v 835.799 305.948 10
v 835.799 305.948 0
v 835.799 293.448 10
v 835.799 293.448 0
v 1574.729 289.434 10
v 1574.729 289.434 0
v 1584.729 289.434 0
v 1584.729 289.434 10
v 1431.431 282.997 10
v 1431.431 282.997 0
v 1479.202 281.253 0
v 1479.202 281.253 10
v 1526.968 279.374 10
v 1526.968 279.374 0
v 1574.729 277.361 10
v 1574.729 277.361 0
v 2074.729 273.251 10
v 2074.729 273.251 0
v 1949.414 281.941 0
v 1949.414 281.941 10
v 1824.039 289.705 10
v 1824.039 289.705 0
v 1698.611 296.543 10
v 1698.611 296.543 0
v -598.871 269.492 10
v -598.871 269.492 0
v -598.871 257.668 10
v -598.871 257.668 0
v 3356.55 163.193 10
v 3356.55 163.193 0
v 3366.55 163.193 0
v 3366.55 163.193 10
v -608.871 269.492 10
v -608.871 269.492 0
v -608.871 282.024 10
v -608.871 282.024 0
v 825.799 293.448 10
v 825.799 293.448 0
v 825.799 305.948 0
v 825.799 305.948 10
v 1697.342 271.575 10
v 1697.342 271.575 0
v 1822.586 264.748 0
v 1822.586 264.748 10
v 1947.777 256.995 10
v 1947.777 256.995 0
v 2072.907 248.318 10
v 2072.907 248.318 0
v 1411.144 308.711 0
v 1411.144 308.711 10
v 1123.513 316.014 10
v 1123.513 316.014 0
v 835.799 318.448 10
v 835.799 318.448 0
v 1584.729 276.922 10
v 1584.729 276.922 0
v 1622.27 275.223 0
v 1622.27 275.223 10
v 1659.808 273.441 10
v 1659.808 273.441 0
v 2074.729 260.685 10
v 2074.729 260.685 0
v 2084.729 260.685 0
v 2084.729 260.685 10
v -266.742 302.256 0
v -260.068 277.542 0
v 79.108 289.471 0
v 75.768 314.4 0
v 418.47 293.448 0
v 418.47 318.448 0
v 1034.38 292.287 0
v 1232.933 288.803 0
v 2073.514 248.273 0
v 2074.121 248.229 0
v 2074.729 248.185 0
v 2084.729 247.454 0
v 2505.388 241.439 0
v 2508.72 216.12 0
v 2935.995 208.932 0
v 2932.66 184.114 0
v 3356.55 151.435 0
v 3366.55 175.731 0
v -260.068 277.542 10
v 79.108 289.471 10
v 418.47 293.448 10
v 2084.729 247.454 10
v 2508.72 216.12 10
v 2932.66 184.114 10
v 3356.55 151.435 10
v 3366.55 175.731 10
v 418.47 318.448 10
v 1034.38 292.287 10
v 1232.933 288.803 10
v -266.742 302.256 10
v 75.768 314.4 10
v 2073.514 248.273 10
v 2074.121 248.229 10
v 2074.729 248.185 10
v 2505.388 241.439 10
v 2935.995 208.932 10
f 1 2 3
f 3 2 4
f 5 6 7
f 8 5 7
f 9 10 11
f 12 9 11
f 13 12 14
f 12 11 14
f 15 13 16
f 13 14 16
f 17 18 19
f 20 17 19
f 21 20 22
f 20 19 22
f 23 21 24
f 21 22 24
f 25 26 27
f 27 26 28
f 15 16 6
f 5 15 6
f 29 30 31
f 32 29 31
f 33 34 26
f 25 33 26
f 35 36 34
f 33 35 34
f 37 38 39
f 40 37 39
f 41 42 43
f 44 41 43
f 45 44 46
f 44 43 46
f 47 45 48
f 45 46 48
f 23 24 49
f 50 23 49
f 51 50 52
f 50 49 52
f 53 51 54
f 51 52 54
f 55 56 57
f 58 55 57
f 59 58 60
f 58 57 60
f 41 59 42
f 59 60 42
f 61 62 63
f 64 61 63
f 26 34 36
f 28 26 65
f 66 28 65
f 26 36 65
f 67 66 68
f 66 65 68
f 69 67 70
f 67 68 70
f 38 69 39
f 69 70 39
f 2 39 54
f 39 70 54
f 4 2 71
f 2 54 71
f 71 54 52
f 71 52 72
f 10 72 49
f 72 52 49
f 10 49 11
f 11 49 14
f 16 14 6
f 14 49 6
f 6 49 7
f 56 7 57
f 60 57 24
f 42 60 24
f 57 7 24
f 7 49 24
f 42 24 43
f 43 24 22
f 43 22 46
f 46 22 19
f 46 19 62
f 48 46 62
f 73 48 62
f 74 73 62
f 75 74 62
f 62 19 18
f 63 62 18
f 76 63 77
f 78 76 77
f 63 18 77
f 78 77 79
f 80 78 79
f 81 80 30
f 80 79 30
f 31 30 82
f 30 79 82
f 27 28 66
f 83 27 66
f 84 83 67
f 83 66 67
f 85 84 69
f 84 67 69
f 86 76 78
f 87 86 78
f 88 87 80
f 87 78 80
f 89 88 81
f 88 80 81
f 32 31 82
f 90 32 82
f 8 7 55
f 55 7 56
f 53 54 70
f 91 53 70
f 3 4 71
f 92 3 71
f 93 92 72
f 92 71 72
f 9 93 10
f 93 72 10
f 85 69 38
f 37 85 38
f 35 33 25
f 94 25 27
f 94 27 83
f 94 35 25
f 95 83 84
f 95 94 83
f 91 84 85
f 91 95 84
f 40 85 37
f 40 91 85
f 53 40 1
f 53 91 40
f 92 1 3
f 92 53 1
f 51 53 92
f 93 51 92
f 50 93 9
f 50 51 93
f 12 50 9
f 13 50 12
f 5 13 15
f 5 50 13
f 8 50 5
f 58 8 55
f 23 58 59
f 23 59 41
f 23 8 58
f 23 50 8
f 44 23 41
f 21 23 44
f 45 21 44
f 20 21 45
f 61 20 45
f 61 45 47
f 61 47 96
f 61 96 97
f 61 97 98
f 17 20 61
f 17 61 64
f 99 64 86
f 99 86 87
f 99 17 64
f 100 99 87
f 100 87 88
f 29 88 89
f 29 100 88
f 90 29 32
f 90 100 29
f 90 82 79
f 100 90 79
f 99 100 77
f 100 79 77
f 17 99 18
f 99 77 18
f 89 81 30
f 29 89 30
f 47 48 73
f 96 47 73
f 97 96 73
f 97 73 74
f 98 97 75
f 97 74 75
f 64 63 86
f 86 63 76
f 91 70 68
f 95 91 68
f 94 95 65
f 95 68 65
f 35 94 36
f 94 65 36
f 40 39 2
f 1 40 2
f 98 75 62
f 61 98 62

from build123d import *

# Parameters (mm, degrees)
BOSS_EXTRUDE1_DEPTH = 10


with BuildPart() as part:
    # Sketch1 → Boss-Extrude1 (new body)
    with BuildSketch(Plane.XY):
        with BuildLine():
            Line((-608.870505757, 282.023599337), (-608.870505757, 269.49207832))
            Line((-608.870505757, 269.49207832), (-598.870505757, 269.49207832))
            Line((-598.870505757, 269.49207832), (-598.870505757, 257.668308621))
            ThreePointArc((-598.870505757, 257.668308621), (-90.514623069, 284.500507433), (418.470256952, 293.448259545))
            Line((418.470256952, 293.448259545), (825.79936838, 293.448259545))
            Line((825.79936838, 293.448259545), (825.799368379, 305.948259545))
            Line((825.799368379, 305.948259545), (835.799368379, 305.948259545))
            Line((835.799368379, 305.948259545), (835.799368381, 293.448259545))
            ThreePointArc((835.799368381, 293.448259545), (1133.661186166, 290.835244695), (1431.431319542, 282.997004454))
            ThreePointArc((1431.431319542, 282.997004454), (1503.085939586, 280.330146604), (1574.728657642, 277.360693119))
            Line((1574.728657642, 277.360693119), (1574.728657641, 289.434265214))
            Line((1574.728657641, 289.434265214), (1584.728657641, 289.434265214))
            Line((1584.728657641, 289.434265214), (1584.728657641, 276.922104092))
            ThreePointArc((1584.728657641, 276.922104092), (1641.039746916, 274.342060096), (1697.341959691, 271.575069153))
            ThreePointArc((1697.341959691, 271.575069153), (1885.188935099, 260.986829911), (2072.907043911, 248.31763089))
            ThreePointArc((2072.907043911, 248.31763089), (2073.81785089, 248.251086909), (2074.728657642, 248.184539822))
            Line((2074.728657642, 248.184539822), (2074.728657641, 260.684539822))
            Line((2074.728657641, 260.684539822), (2084.728657641, 260.684539822))
            Line((2084.728657641, 260.684539822), (2084.728657642, 247.453695579))
            ThreePointArc((2084.728657642, 247.453695579), (2720.696358676, 200.201158042), (3356.549748161, 151.43450813))
            Line((3356.549748161, 151.43450813), (3356.549748161, 163.1932914))
            Line((3356.549748161, 163.1932914), (3366.549748161, 163.1932914))
            Line((3366.549748161, 163.1932914), (3366.549748161, 175.731187268))
            ThreePointArc((3366.549748161, 175.731187268), (2720.698159353, 225.272162423), (2074.728657642, 273.251177036))
            ThreePointArc((2074.728657642, 273.251177036), (1886.73413806, 285.939031173), (1698.61056213, 296.542861364))
            ThreePointArc((1698.61056213, 296.542861364), (1267.343978626, 312.97102781), (835.79936838, 318.448259545))
            Line((835.79936838, 318.448259545), (418.470256952, 318.448259545))
            ThreePointArc((418.470256952, 318.448259545), (-95.522884684, 309.339234502), (-608.870505757, 282.023599337))
        make_face()
    extrude(amount=BOSS_EXTRUDE1_DEPTH)


solid = part.part
